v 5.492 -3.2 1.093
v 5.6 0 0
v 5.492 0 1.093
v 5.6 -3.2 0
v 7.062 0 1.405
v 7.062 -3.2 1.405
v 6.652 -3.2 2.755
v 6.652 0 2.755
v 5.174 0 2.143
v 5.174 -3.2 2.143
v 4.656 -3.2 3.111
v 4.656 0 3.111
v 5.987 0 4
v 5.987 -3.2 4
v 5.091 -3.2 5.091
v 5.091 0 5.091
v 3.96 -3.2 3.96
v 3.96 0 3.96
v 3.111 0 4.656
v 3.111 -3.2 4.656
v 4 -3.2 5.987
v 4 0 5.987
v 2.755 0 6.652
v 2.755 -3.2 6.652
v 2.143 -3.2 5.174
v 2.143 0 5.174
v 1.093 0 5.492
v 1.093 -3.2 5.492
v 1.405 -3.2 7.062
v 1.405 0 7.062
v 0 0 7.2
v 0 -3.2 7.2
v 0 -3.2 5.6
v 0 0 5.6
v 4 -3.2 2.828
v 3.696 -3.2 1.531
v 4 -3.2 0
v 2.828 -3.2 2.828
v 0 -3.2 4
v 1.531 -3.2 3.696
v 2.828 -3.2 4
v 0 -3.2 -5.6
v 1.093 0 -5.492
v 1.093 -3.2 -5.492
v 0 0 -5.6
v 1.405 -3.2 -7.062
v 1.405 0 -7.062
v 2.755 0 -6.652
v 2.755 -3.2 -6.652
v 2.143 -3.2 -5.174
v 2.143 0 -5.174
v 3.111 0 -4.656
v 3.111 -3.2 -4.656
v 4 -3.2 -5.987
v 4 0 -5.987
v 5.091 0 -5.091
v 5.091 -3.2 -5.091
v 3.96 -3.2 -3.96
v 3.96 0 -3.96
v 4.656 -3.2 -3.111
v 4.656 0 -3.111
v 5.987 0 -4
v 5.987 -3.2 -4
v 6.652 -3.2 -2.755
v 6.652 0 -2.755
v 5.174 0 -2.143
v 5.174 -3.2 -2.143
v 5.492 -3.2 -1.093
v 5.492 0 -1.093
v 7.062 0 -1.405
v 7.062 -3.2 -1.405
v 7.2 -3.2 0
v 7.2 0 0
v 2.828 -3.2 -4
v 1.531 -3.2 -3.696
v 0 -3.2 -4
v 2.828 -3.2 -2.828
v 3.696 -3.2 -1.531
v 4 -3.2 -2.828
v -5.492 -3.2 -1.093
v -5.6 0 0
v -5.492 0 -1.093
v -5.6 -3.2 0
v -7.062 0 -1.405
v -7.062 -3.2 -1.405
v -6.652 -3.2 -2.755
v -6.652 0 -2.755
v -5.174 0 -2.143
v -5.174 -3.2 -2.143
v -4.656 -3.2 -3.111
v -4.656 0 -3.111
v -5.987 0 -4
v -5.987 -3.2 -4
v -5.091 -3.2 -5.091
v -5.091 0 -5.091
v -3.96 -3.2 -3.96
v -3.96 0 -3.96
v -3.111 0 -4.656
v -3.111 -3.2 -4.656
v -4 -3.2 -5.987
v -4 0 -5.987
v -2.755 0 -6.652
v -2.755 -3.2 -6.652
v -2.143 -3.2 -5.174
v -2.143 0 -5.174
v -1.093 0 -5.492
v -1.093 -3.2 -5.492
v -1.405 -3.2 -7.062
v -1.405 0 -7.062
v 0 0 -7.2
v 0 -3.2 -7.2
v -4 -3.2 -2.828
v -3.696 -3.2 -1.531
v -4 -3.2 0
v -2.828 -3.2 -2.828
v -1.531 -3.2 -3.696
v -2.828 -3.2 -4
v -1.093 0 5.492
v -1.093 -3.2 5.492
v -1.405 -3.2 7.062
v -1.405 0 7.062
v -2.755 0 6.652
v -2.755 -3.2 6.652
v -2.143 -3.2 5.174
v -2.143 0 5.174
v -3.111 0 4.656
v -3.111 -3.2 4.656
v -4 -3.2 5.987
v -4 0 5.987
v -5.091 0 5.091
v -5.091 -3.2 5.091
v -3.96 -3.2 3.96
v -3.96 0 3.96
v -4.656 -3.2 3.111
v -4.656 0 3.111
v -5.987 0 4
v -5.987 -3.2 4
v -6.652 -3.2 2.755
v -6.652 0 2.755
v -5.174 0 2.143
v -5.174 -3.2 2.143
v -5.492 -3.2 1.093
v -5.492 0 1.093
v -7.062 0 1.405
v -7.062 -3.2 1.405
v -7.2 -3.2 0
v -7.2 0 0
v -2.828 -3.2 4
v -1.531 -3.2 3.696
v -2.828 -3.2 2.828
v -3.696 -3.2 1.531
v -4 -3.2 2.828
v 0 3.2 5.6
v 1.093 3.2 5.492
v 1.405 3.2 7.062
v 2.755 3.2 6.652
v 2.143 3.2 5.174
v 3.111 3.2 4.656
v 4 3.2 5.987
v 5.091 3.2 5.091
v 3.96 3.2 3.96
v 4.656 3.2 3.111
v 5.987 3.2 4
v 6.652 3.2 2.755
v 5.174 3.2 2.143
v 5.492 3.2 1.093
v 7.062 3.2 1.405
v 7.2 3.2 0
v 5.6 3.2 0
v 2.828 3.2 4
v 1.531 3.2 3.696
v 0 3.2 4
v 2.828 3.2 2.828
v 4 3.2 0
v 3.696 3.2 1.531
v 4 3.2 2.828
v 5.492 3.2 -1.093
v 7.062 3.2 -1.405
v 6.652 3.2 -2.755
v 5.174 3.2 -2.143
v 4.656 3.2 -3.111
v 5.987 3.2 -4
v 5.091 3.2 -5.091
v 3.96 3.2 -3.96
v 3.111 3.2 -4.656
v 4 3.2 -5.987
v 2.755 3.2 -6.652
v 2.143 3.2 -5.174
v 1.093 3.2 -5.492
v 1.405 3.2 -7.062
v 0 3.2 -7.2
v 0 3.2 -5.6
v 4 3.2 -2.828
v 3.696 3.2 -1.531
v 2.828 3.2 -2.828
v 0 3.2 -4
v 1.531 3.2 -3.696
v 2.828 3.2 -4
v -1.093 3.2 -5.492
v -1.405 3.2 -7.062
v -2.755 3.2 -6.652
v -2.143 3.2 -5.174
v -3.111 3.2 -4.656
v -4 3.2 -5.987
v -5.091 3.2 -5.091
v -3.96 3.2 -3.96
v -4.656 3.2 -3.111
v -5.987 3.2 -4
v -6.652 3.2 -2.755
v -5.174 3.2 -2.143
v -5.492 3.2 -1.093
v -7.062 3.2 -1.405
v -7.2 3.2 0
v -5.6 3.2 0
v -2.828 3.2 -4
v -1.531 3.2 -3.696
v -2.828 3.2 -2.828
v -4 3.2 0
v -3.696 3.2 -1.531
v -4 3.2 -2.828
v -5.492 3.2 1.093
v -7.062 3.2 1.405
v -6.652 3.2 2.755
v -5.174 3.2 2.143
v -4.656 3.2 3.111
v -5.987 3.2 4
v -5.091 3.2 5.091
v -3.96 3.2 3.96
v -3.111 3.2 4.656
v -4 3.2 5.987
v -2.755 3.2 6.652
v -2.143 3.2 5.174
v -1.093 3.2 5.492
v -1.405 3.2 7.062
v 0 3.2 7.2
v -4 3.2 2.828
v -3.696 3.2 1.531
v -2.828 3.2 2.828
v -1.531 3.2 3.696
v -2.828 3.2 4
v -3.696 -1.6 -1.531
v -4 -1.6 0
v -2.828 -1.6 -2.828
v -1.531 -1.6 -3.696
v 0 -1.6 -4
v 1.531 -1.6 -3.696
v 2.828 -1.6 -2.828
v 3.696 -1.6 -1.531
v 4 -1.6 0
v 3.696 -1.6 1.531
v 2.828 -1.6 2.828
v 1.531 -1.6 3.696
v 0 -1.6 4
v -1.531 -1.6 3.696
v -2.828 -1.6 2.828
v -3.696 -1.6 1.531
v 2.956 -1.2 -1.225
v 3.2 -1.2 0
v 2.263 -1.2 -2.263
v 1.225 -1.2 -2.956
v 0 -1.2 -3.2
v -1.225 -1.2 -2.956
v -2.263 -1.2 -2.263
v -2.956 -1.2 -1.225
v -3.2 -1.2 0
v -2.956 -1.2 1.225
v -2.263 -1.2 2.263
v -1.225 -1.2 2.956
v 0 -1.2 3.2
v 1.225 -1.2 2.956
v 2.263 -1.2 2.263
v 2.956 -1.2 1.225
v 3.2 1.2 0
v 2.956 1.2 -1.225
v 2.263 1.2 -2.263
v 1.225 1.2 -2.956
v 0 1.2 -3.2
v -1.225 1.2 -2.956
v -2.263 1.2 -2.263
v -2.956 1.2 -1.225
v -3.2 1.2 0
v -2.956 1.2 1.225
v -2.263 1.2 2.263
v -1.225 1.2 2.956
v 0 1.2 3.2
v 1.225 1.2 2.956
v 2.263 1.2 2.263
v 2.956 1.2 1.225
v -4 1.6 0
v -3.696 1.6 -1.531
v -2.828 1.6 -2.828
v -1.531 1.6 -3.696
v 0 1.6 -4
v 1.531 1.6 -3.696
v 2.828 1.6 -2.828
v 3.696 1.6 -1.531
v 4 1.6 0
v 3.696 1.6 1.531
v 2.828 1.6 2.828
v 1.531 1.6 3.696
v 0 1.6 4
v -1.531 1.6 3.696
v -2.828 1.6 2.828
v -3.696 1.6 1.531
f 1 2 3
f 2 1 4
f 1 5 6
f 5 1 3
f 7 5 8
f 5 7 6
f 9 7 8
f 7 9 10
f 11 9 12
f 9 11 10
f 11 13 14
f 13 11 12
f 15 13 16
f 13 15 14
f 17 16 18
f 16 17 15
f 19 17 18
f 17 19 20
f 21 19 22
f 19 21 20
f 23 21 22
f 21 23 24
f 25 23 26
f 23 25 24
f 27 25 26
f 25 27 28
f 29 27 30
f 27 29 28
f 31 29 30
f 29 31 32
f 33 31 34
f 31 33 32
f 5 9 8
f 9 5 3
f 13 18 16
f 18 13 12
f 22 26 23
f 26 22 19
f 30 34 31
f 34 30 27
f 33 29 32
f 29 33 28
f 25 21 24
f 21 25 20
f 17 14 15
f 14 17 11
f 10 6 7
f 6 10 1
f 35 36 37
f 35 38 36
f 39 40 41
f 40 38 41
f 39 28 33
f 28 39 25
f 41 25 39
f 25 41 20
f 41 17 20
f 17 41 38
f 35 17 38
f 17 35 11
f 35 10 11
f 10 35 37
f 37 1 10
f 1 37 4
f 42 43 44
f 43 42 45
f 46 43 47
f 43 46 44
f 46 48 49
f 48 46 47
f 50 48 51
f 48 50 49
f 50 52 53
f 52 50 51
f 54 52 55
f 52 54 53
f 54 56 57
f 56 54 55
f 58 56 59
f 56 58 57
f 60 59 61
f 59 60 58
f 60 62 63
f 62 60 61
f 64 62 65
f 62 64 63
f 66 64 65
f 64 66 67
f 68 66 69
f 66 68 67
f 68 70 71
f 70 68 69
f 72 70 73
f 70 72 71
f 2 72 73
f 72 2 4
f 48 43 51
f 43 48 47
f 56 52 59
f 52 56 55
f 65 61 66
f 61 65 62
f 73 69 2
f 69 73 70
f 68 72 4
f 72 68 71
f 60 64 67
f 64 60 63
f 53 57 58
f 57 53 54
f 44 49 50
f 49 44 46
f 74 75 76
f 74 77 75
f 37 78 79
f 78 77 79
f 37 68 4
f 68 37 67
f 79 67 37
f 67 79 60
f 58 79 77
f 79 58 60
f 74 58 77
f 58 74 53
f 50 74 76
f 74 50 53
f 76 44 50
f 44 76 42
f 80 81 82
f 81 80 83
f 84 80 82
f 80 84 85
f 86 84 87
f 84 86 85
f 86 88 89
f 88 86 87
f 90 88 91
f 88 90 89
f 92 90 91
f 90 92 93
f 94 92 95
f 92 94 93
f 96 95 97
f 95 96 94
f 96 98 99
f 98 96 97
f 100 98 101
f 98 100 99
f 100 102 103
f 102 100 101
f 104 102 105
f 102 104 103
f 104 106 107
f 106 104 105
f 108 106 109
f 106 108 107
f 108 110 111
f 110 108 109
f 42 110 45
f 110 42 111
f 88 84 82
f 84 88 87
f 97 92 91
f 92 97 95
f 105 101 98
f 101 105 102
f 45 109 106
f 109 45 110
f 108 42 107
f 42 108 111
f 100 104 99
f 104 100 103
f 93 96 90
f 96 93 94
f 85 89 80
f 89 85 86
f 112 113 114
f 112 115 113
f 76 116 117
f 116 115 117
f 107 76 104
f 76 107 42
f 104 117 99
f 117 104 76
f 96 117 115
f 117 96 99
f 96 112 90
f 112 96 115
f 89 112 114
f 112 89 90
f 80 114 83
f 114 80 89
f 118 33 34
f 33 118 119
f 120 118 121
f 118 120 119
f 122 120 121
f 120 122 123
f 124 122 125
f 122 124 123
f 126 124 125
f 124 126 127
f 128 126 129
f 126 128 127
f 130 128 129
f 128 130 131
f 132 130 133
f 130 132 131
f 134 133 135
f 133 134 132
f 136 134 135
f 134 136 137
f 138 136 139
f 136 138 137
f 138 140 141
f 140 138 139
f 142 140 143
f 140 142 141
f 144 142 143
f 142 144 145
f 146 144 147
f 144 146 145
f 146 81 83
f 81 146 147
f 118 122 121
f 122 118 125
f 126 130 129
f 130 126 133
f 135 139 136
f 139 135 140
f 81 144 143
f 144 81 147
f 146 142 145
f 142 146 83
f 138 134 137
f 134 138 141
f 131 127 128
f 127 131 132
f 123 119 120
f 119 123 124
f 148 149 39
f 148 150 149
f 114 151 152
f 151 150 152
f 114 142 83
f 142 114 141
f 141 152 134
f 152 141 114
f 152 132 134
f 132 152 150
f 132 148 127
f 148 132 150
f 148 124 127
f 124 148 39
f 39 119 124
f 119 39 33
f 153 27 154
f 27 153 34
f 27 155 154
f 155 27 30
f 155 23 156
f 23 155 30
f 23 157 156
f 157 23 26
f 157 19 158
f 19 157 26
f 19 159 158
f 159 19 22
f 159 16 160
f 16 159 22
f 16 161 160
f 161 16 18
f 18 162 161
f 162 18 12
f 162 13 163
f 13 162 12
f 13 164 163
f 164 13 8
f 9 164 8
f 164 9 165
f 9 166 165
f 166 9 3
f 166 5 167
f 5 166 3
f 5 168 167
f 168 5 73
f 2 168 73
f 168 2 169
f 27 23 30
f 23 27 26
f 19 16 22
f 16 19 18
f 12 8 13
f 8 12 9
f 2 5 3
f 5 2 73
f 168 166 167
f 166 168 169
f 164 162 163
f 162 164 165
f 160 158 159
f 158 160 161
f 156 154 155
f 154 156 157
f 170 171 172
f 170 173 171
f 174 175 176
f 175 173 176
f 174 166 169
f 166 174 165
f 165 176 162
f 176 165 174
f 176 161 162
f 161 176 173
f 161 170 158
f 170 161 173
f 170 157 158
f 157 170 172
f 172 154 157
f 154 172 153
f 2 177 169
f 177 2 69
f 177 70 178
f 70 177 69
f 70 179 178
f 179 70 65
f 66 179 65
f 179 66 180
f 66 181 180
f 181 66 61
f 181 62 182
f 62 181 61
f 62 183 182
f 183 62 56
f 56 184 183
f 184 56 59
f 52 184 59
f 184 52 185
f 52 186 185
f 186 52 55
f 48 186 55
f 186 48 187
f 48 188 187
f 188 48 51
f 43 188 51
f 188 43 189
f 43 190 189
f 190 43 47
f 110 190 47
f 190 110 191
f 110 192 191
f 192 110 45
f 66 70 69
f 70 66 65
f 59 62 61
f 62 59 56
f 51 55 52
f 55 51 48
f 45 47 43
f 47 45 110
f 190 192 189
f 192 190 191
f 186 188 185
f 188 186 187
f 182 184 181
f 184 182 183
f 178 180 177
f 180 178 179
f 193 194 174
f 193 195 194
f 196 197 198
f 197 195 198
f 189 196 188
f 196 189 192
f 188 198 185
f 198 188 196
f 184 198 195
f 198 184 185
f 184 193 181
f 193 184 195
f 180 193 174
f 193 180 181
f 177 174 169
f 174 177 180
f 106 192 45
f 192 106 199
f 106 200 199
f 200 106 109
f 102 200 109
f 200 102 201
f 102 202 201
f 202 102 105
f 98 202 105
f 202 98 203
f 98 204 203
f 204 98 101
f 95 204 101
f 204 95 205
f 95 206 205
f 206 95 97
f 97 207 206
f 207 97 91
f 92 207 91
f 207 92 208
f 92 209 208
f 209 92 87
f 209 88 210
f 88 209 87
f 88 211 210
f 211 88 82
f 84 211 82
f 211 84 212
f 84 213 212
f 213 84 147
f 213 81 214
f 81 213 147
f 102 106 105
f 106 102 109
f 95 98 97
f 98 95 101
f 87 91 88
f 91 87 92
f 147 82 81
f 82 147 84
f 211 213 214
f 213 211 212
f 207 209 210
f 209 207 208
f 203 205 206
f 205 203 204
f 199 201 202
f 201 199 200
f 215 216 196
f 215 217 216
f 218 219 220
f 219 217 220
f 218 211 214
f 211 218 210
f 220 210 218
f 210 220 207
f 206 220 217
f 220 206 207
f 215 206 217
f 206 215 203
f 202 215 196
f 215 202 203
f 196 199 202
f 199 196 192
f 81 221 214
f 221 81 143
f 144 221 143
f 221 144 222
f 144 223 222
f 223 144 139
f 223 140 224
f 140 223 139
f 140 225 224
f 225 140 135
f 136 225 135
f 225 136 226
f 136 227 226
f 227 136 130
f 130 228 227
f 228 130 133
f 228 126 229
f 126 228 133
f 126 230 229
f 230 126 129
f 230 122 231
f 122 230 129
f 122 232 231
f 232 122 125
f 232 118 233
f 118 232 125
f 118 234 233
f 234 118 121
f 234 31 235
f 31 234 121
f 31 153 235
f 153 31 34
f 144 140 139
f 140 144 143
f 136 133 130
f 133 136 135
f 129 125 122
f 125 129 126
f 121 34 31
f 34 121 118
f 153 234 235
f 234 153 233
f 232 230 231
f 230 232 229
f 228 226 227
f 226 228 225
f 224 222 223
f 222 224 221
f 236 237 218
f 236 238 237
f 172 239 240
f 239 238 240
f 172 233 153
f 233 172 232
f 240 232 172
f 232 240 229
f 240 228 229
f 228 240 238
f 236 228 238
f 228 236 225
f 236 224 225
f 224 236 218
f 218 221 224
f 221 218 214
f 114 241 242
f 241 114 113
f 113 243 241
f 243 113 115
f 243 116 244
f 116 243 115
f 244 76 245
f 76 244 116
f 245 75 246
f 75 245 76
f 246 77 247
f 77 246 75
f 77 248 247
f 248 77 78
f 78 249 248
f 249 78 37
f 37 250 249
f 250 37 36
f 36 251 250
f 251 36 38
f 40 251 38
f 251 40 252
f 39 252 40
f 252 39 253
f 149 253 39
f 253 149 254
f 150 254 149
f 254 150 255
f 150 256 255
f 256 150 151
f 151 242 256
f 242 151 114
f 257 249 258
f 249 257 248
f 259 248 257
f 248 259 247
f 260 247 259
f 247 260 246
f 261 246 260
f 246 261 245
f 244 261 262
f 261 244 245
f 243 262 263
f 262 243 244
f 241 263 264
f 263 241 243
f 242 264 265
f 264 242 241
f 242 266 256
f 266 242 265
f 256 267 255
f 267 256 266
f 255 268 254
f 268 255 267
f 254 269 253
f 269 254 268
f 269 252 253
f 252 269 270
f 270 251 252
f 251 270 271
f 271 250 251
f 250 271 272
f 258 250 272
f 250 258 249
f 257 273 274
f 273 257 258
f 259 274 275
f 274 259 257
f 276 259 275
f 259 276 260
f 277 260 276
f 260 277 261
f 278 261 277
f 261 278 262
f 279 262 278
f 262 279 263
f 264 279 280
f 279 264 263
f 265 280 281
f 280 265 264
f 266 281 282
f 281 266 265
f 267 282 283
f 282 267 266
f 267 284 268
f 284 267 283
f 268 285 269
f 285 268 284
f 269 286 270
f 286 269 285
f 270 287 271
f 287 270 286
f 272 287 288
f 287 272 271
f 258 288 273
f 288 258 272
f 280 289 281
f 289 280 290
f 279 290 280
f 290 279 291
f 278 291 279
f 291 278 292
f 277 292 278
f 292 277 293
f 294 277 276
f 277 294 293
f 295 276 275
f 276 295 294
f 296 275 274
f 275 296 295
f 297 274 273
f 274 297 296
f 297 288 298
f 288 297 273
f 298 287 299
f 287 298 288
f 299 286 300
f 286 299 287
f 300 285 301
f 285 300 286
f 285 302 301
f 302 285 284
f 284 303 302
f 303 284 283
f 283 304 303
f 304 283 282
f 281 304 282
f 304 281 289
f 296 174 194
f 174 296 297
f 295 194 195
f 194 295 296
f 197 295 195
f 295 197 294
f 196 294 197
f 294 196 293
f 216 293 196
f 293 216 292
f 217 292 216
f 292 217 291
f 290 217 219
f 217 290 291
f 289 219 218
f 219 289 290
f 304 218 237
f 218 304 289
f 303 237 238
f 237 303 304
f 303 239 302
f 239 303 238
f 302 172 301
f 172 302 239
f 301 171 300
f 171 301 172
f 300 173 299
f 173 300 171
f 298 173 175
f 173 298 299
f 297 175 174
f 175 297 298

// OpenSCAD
// file: ../p/rect3.scad
use <../lib.scad>
function ldraw_lib__rect3() = [
// 0 Rectangle with 3 Edges
// 0 Name: rect3.dat
// 0 Author: Mark Kennedy [mkennedy]
// 0 !LDRAW_ORG Primitive UPDATE 2010-01
// 0 !LICENSE Licensed under CC BY 4.0 : see CAreadme.txt
// 
// 0 BFC CERTIFY CCW
  [0,"BFC","CERTIFY"],
  [0,"BFC","CCW"],
// 
// 0 !HISTORY 2003-08-01 [PTadmin] Official Update 2003-02
// 0 !HISTORY 2007-06-24 [PTadmin] Header formatted for Contributor Agreement
// 0 !HISTORY 2008-07-01 [PTadmin] Official Update 2008-01
// 0 !HISTORY 2010-01-17 [mikeheide] Change winding to CCW
// 0 !HISTORY 2010-04-05 [PTadmin] Official Update 2010-01
// 
// 
// 2 24 1 0 1 -1 0 1
  [2,24,1,0,1,-1,0,1],
// 2 24 1 0 1 1 0 -1
  [2,24,1,0,1,1,0,-1],
// 2 24 -1 0 1 -1 0 -1
  [2,24,-1,0,1,-1,0,-1],
// 4 16 -1 0 1 -1 0 -1 1 0 -1 1 0 1
  [4,16,-1,0,1,-1,0,-1,1,0,-1,1,0,1],
// 0 //
];
module ldraw_lib__rect3(step=0, col=false, unit=2/5, alt=false, line=0.2, solid=!$preview)
    makepoly(ldraw_lib__rect3(), step=step, col=col, unit=unit, alt=alt, line=line, solid=solid);
ldraw_lib__rect3(line=0.2);
// file: ../p/rect2p.scad
use <../lib.scad>
function ldraw_lib__rect2p() = [
// 0 Rectangle with 2 Parallel Edges
// 0 Name: rect2p.dat
// 0 Author: Donald Sutter [technog]
// 0 !LDRAW_ORG Primitive UPDATE 2010-01
// 0 !LICENSE Licensed under CC BY 4.0 : see CAreadme.txt
// 
// 0 BFC CERTIFY CCW
  [0,"BFC","CERTIFY"],
  [0,"BFC","CCW"],
// 
// 0 !HISTORY 2003-08-01 [PTadmin] Official Update 2003-02
// 0 !HISTORY 2007-06-24 [PTadmin] Header formatted for Contributor Agreement
// 0 !HISTORY 2008-07-01 [PTadmin] Official Update 2008-01
// 0 !HISTORY 2010-01-17 [mikeheide] changed winding to CCW
// 0 !HISTORY 2010-04-05 [PTadmin] Official Update 2010-01
// 
// 
// 2 24 1 0 1 -1 0 1
  [2,24,1,0,1,-1,0,1],
// 2 24 -1 0 -1 1 0 -1
  [2,24,-1,0,-1,1,0,-1],
// 4 16 -1 0 1 -1 0 -1 1 0 -1 1 0 1
  [4,16,-1,0,1,-1,0,-1,1,0,-1,1,0,1],
// 0
];
module ldraw_lib__rect2p(step=0, col=false, unit=2/5, alt=false, line=0.2, solid=!$preview)
    makepoly(ldraw_lib__rect2p(), step=step, col=col, unit=unit, alt=alt, line=line, solid=solid);
ldraw_lib__rect2p(line=0.2);
// file: ../p/rect.scad
use <../lib.scad>
function ldraw_lib__rect() = [
// 0 Rectangle
// 0 Name: rect.dat
// 0 Author: James Jessiman
// 0 !LDRAW_ORG Primitive UPDATE 2010-01
// 0 !LICENSE Licensed under CC BY 4.0 : see CAreadme.txt
// 
// 0 BFC CERTIFY CCW
  [0,"BFC","CERTIFY"],
  [0,"BFC","CCW"],
// 
// 0 !HISTORY 2002-04-05 [hafhead] Added BFC statement
// 0 !HISTORY 2002-04-25 [PTadmin] Official Update 2002-02
// 0 !HISTORY 2007-06-24 [PTadmin] Header formatted for Contributor Agreement
// 0 !HISTORY 2008-07-01 [PTadmin] Official Update 2008-01
// 0 !HISTORY 2010-01-17 [mikeheide] changed winding to CCW
// 0 !HISTORY 2010-04-05 [PTadmin] Official Update 2010-01
// 
// 
// 2 24 1 0 1 -1 0 1
  [2,24,1,0,1,-1,0,1],
// 2 24 -1 0 1 -1 0 -1
  [2,24,-1,0,1,-1,0,-1],
// 2 24 -1 0 -1 1 0 -1
  [2,24,-1,0,-1,1,0,-1],
// 2 24 1 0 -1 1 0 1
  [2,24,1,0,-1,1,0,1],
// 4 16 -1 0 1 -1 0 -1 1 0 -1 1 0 1
  [4,16,-1,0,1,-1,0,-1,1,0,-1,1,0,1],
// 0
];
module ldraw_lib__rect(step=0, col=false, unit=2/5, alt=false, line=0.2, solid=!$preview)
    makepoly(ldraw_lib__rect(), step=step, col=col, unit=unit, alt=alt, line=line, solid=solid);
ldraw_lib__rect(line=0.2);
// file: ../p/1-8tndis.scad
use <../lib.scad>
function ldraw_lib__1_8tndis() = [
// 0 Disc Negative Truncated 0.125
// 0 Name: 1-8tndis.dat
// 0 Author: Massimo Maso [Sirio]
// 0 !LDRAW_ORG Primitive UPDATE 2022-02
// 0 !LICENSE Licensed under CC BY 4.0 : see CAreadme.txt
// 
// 0 BFC CERTIFY CCW
  [0,"BFC","CERTIFY"],
  [0,"BFC","CCW"],
// 
// 0 !HISTORY 2022-03-06 [PTadmin] Official Update 2022-02
// 
// 
// 3 16 1 0 .7071 .9239 0 .3827 1 0 0
  [3,16,1,0,.7071,.9239,0,.3827,1,0,0],
// 3 16 1 0 .7071 .7071 0 .7071 .9239 0 .3827
  [3,16,1,0,.7071,.7071,0,.7071,.9239,0,.3827],
];
module ldraw_lib__1_8tndis(step=0, col=false, unit=2/5, alt=false, line=0.2, solid=!$preview)
    makepoly(ldraw_lib__1_8tndis(), step=step, col=col, unit=unit, alt=alt, line=line, solid=solid);
ldraw_lib__1_8tndis(line=0.2);
// file: ../p/4-4edge.scad
use <../lib.scad>
function ldraw_lib__4_4edge() = [
// 0 Circle 1.0
// 0 Name: 4-4edge.dat
// 0 Author: James Jessiman
// 0 !LDRAW_ORG Primitive UPDATE 2017-01
// 0 !LICENSE Licensed under CC BY 4.0 : see CAreadme.txt
// 
// 0 BFC CERTIFY CCW
  [0,"BFC","CERTIFY"],
  [0,"BFC","CCW"],
// 
// 0 !HISTORY 1998-12-15 [PTadmin] Official Update 1998-10
// 0 !HISTORY 2005-12-28 [PTadmin] Official Update 2005-01
// 0 !HISTORY 2007-06-24 [PTadmin] Header formatted for Contributor Agreement
// 0 !HISTORY 2008-07-01 [PTadmin] Official Update 2008-01
// 0 !HISTORY 2017-01-15 [Steffen] BFCed
// 0 !HISTORY 2017-12-30 [PTadmin] Official Update 2017-01
// 
// 
// 2 24 1 0 0 0.9239 0 0.3827
  [2,24,1,0,0,0.9239,0,0.3827],
// 2 24 0.9239 0 0.3827 0.7071 0 0.7071
  [2,24,0.9239,0,0.3827,0.7071,0,0.7071],
// 2 24 0.7071 0 0.7071 0.3827 0 0.9239
  [2,24,0.7071,0,0.7071,0.3827,0,0.9239],
// 2 24 0.3827 0 0.9239 0 0 1
  [2,24,0.3827,0,0.9239,0,0,1],
// 2 24 0 0 1 -0.3827 0 0.9239
  [2,24,0,0,1,-0.3827,0,0.9239],
// 2 24 -0.3827 0 0.9239 -0.7071 0 0.7071
  [2,24,-0.3827,0,0.9239,-0.7071,0,0.7071],
// 2 24 -0.7071 0 0.7071 -0.9239 0 0.3827
  [2,24,-0.7071,0,0.7071,-0.9239,0,0.3827],
// 2 24 -0.9239 0 0.3827 -1 0 -0
  [2,24,-0.9239,0,0.3827,-1,0,-0],
// 2 24 -1 0 -0 -0.9239 0 -0.3827
  [2,24,-1,0,-0,-0.9239,0,-0.3827],
// 2 24 -0.9239 0 -0.3827 -0.7071 0 -0.7071
  [2,24,-0.9239,0,-0.3827,-0.7071,0,-0.7071],
// 2 24 -0.7071 0 -0.7071 -0.3827 0 -0.9239
  [2,24,-0.7071,0,-0.7071,-0.3827,0,-0.9239],
// 2 24 -0.3827 0 -0.9239 0 0 -1
  [2,24,-0.3827,0,-0.9239,0,0,-1],
// 2 24 0 0 -1 0.3827 0 -0.9239
  [2,24,0,0,-1,0.3827,0,-0.9239],
// 2 24 0.3827 0 -0.9239 0.7071 0 -0.7071
  [2,24,0.3827,0,-0.9239,0.7071,0,-0.7071],
// 2 24 0.7071 0 -0.7071 0.9239 0 -0.3827
  [2,24,0.7071,0,-0.7071,0.9239,0,-0.3827],
// 2 24 0.9239 0 -0.3827 1 0 0
  [2,24,0.9239,0,-0.3827,1,0,0],
];
module ldraw_lib__4_4edge(step=0, col=false, unit=2/5, alt=false, line=0.2, solid=!$preview)
    makepoly(ldraw_lib__4_4edge(), step=step, col=col, unit=unit, alt=alt, line=line, solid=solid);
ldraw_lib__4_4edge(line=0.2);
// file: ../p/4-4cyli.scad
use <../lib.scad>
function ldraw_lib__4_4cyli() = [
// 0 Cylinder 1.0
// 0 Name: 4-4cyli.dat
// 0 Author: James Jessiman
// 0 !LDRAW_ORG Primitive UPDATE 2005-01
// 0 !LICENSE Licensed under CC BY 4.0 : see CAreadme.txt
// 
// 0 BFC CERTIFY CCW
  [0,"BFC","CERTIFY"],
  [0,"BFC","CCW"],
// 
// 0 !HISTORY 1998-12-15 [PTadmin] Official Update 1998-10
// 0 !HISTORY 2002-03-23 [sbliss] Added BFC statement; merged headers from files in distributions LDraw 0.27 and Complete.
// 0 !HISTORY 2002-04-25 [PTadmin] Official Update 2002-02
// 0 !HISTORY 2004-12-14 [guyvivan] BFC CCW
// 0 !HISTORY 2005-12-28 [PTadmin] Official Update 2005-01
// 0 !HISTORY 2007-06-24 [PTadmin] Header formatted for Contributor Agreement
// 0 !HISTORY 2008-07-01 [PTadmin] Official Update 2008-01
// 
// 
// 4 16 1 1 0 0.9239 1 0.3827 0.9239 0 0.3827 1 0 0
  [4,16,1,1,0,0.9239,1,0.3827,0.9239,0,0.3827,1,0,0],
// 5 24 1 0 0 1 1 0 0.9239 0 0.3827 0.9239 0 -0.3827
  [5,24,1,0,0,1,1,0,0.9239,0,0.3827,0.9239,0,-0.3827],
// 4 16 0.9239 1 0.3827 0.7071 1 0.7071 0.7071 0 0.7071 0.9239 0 0.3827
  [4,16,0.9239,1,0.3827,0.7071,1,0.7071,0.7071,0,0.7071,0.9239,0,0.3827],
// 5 24 0.9239 0 0.3827 0.9239 1 0.3827 0.7071 0 0.7071 1 0 0
  [5,24,0.9239,0,0.3827,0.9239,1,0.3827,0.7071,0,0.7071,1,0,0],
// 4 16 0.7071 1 0.7071 0.3827 1 0.9239 0.3827 0 0.9239 0.7071 0 0.7071
  [4,16,0.7071,1,0.7071,0.3827,1,0.9239,0.3827,0,0.9239,0.7071,0,0.7071],
// 5 24 0.7071 0 0.7071 0.7071 1 0.7071 0.3827 0 0.9239 0.9239 0 0.3827
  [5,24,0.7071,0,0.7071,0.7071,1,0.7071,0.3827,0,0.9239,0.9239,0,0.3827],
// 4 16 0.3827 1 0.9239 0 1 1 0 0 1 0.3827 0 0.9239
  [4,16,0.3827,1,0.9239,0,1,1,0,0,1,0.3827,0,0.9239],
// 5 24 0.3827 0 0.9239 0.3827 1 0.9239 0 0 1 0.7071 0 0.7071
  [5,24,0.3827,0,0.9239,0.3827,1,0.9239,0,0,1,0.7071,0,0.7071],
// 4 16 0 1 1 -0.3827 1 0.9239 -0.3827 0 0.9239 0 0 1
  [4,16,0,1,1,-0.3827,1,0.9239,-0.3827,0,0.9239,0,0,1],
// 5 24 0 0 1 0 1 1 -0.3827 0 0.9239 0.3827 0 0.9239
  [5,24,0,0,1,0,1,1,-0.3827,0,0.9239,0.3827,0,0.9239],
// 4 16 -0.3827 1 0.9239 -0.7071 1 0.7071 -0.7071 0 0.7071 -0.3827 0 0.9239
  [4,16,-0.3827,1,0.9239,-0.7071,1,0.7071,-0.7071,0,0.7071,-0.3827,0,0.9239],
// 5 24 -0.3827 0 0.9239 -0.3827 1 0.9239 -0.7071 0 0.7071 0 0 1
  [5,24,-0.3827,0,0.9239,-0.3827,1,0.9239,-0.7071,0,0.7071,0,0,1],
// 4 16 -0.7071 1 0.7071 -0.9239 1 0.3827 -0.9239 0 0.3827 -0.7071 0 0.7071
  [4,16,-0.7071,1,0.7071,-0.9239,1,0.3827,-0.9239,0,0.3827,-0.7071,0,0.7071],
// 5 24 -0.7071 0 0.7071 -0.7071 1 0.7071 -0.9239 0 0.3827 -0.3827 0 0.9239
  [5,24,-0.7071,0,0.7071,-0.7071,1,0.7071,-0.9239,0,0.3827,-0.3827,0,0.9239],
// 4 16 -0.9239 1 0.3827 -1 1 0 -1 0 0 -0.9239 0 0.3827
  [4,16,-0.9239,1,0.3827,-1,1,0,-1,0,0,-0.9239,0,0.3827],
// 5 24 -0.9239 0 0.3827 -0.9239 1 0.3827 -1 0 0 -0.7071 0 0.7071
  [5,24,-0.9239,0,0.3827,-0.9239,1,0.3827,-1,0,0,-0.7071,0,0.7071],
// 4 16 -1 1 0 -0.9239 1 -0.3827 -0.9239 0 -0.3827 -1 0 0
  [4,16,-1,1,0,-0.9239,1,-0.3827,-0.9239,0,-0.3827,-1,0,0],
// 5 24 -1 0 0 -1 1 0 -0.9239 0 -0.3827 -0.9239 0 0.3827
  [5,24,-1,0,0,-1,1,0,-0.9239,0,-0.3827,-0.9239,0,0.3827],
// 4 16 -0.9239 1 -0.3827 -0.7071 1 -0.7071 -0.7071 0 -0.7071 -0.9239 0 -0.3827
  [4,16,-0.9239,1,-0.3827,-0.7071,1,-0.7071,-0.7071,0,-0.7071,-0.9239,0,-0.3827],
// 5 24 -0.9239 0 -0.3827 -0.9239 1 -0.3827 -0.7071 0 -0.7071 -1 0 0
  [5,24,-0.9239,0,-0.3827,-0.9239,1,-0.3827,-0.7071,0,-0.7071,-1,0,0],
// 4 16 -0.7071 1 -0.7071 -0.3827 1 -0.9239 -0.3827 0 -0.9239 -0.7071 0 -0.7071
  [4,16,-0.7071,1,-0.7071,-0.3827,1,-0.9239,-0.3827,0,-0.9239,-0.7071,0,-0.7071],
// 5 24 -0.7071 0 -0.7071 -0.7071 1 -0.7071 -0.3827 0 -0.9239 -0.9239 0 -0.3827
  [5,24,-0.7071,0,-0.7071,-0.7071,1,-0.7071,-0.3827,0,-0.9239,-0.9239,0,-0.3827],
// 4 16 -0.3827 1 -0.9239 0 1 -1 0 0 -1 -0.3827 0 -0.9239
  [4,16,-0.3827,1,-0.9239,0,1,-1,0,0,-1,-0.3827,0,-0.9239],
// 5 24 -0.3827 0 -0.9239 -0.3827 1 -0.9239 0 0 -1 -0.7071 0 -0.7071
  [5,24,-0.3827,0,-0.9239,-0.3827,1,-0.9239,0,0,-1,-0.7071,0,-0.7071],
// 4 16 0 1 -1 0.3827 1 -0.9239 0.3827 0 -0.9239 0 0 -1
  [4,16,0,1,-1,0.3827,1,-0.9239,0.3827,0,-0.9239,0,0,-1],
// 5 24 0 0 -1 0 1 -1 0.3827 0 -0.9239 -0.3827 0 -0.9239
  [5,24,0,0,-1,0,1,-1,0.3827,0,-0.9239,-0.3827,0,-0.9239],
// 4 16 0.3827 1 -0.9239 0.7071 1 -0.7071 0.7071 0 -0.7071 0.3827 0 -0.9239
  [4,16,0.3827,1,-0.9239,0.7071,1,-0.7071,0.7071,0,-0.7071,0.3827,0,-0.9239],
// 5 24 0.3827 0 -0.9239 0.3827 1 -0.9239 0.7071 0 -0.7071 0 0 -1
  [5,24,0.3827,0,-0.9239,0.3827,1,-0.9239,0.7071,0,-0.7071,0,0,-1],
// 4 16 0.7071 1 -0.7071 0.9239 1 -0.3827 0.9239 0 -0.3827 0.7071 0 -0.7071
  [4,16,0.7071,1,-0.7071,0.9239,1,-0.3827,0.9239,0,-0.3827,0.7071,0,-0.7071],
// 5 24 0.7071 0 -0.7071 0.7071 1 -0.7071 0.9239 0 -0.3827 0.3827 0 -0.9239
  [5,24,0.7071,0,-0.7071,0.7071,1,-0.7071,0.9239,0,-0.3827,0.3827,0,-0.9239],
// 4 16 0.9239 1 -0.3827 1 1 0 1 0 0 0.9239 0 -0.3827
  [4,16,0.9239,1,-0.3827,1,1,0,1,0,0,0.9239,0,-0.3827],
// 5 24 0.9239 0 -0.3827 0.9239 1 -0.3827 1 0 0 0.7071 0 -0.7071
  [5,24,0.9239,0,-0.3827,0.9239,1,-0.3827,1,0,0,0.7071,0,-0.7071],
// 0
];
module ldraw_lib__4_4cyli(step=0, col=false, unit=2/5, alt=false, line=0.2, solid=!$preview)
    makepoly(ldraw_lib__4_4cyli(), step=step, col=col, unit=unit, alt=alt, line=line, solid=solid);
ldraw_lib__4_4cyli(line=0.2);
// file: s/3641s01.scad
use <../../lib.scad>
use <../../p/1-8tndis.scad>
use <../../p/rect.scad>
use <../../p/rect2p.scad>
use <../../p/rect3.scad>
function ldraw_lib__s__3641s01() = [
// 0 ~Tyre  6/ 50 x  8 Offset Tread Eigth
// 0 Name: s\3641s01.dat
// 0 Author: Rene Rechthaler [Blechtaler]
// 0 !LDRAW_ORG Subpart UPDATE 2025-03
// 0 !LICENSE Licensed under CC BY 4.0 : see CAreadme.txt
// 
// 0 BFC CERTIFY CCW
  [0,"BFC","CERTIFY"],
  [0,"BFC","CCW"],
// 
// 0 !HISTORY 2025-03-30 [OrionP] Official Update 2025-03
// 
// 1 16 13.8656 -1.3657 -4 .1344 0 0 1.3657 1 0 0 0 4 rect2p.dat
  [1,16,13.8656,-1.3657,-4,.1344,0,0,1.3657,1,0,0,0,4, ldraw_lib__rect2p()],
// 1 16 15.6928 -3.1216 -4 1.9616 0 0 -.3902 -1 0 0 0 4 rect.dat
  [1,16,15.6928,-3.1216,-4,1.9616,0,0,-.3902,-1,0,0,0,4, ldraw_lib__rect()],
// 1 16 17.1423 -5.2002 -4 .5121 0 0 1.6884 1 0 0 0 4 rect2p.dat
  [1,16,17.1423,-5.2002,-4,.5121,0,0,1.6884,1,0,0,0,4, ldraw_lib__rect2p()],
// 1 16 14.7824 -6.1232 -4 -1.8478 0 0 .7654 1 0 0 0 4 rect.dat
  [1,16,14.7824,-6.1232,-4,-1.8478,0,0,.7654,1,0,0,0,4, ldraw_lib__rect()],
// 1 16 12.2878 -6.5681 -4 .6468 0 0 1.2103 1 0 0 0 4 rect2p.dat
  [1,16,12.2878,-6.5681,-4,.6468,0,0,1.2103,1,0,0,0,4, ldraw_lib__rect2p()],
// 1 16 13.304 -8.8896 -4 1.663 0 0 -1.1112 -1 0 0 0 4 rect.dat
  [1,16,13.304,-8.8896,-4,1.663,0,0,-1.1112,-1,0,0,0,4, ldraw_lib__rect()],
// 1 16 13.8474 -11.3643 -4 1.1196 0 0 1.3635 1 0 0 0 4 rect2p.dat
  [1,16,13.8474,-11.3643,-4,1.1196,0,0,1.3635,1,0,0,0,4, ldraw_lib__rect2p()],
// 1 16 11.3136 -11.3136 -4 -1.4142 0 0 1.4142 1 0 0 0 -4 rect3.dat
  [1,16,11.3136,-11.3136,-4,-1.4142,0,0,1.4142,1,0,0,0,-4, ldraw_lib__rect3()],
// 1 16 8.8389 -10.7702 -4 1.0605 0 0 .8708 1 0 0 0 4 rect2p.dat
  [1,16,8.8389,-10.7702,-4,1.0605,0,0,.8708,1,0,0,0,4, ldraw_lib__rect2p()],
// 1 16 8.8896 -13.304 -4 1.1112 0 0 -1.663 -1 0 0 0 -4 rect3.dat
  [1,16,8.8896,-13.304,-4,1.1112,0,0,-1.663,-1,0,0,0,-4, ldraw_lib__rect3()],
// 1 16 8.4447 -15.7986 -4 1.5561 0 0 .8316 1 0 0 0 4 rect2p.dat
  [1,16,8.4447,-15.7986,-4,1.5561,0,0,.8316,1,0,0,0,4, ldraw_lib__rect2p()],
// 1 16 6.1232 -14.7824 -4 -.7654 0 0 1.8478 1 0 0 0 -4 rect3.dat
  [1,16,6.1232,-14.7824,-4,-.7654,0,0,1.8478,1,0,0,0,-4, ldraw_lib__rect3()],
// 1 16 4.0446 -13.3329 -4 1.3132 0 0 .3983 1 0 0 0 4 rect2p.dat
  [1,16,4.0446,-13.3329,-4,1.3132,0,0,.3983,1,0,0,0,4, ldraw_lib__rect2p()],
// 1 16 3.1216 -15.6928 -4 .3902 0 0 -1.9616 -1 0 0 0 -4 rect3.dat
  [1,16,3.1216,-15.6928,-4,.3902,0,0,-1.9616,-1,0,0,0,-4, ldraw_lib__rect3()],
// 1 16 1.7559 -17.8272 -4 1.7559 0 0 .1728 1 0 0 0 4 rect2p.dat
  [1,16,1.7559,-17.8272,-4,1.7559,0,0,.1728,1,0,0,0,4, ldraw_lib__rect2p()],
// 1 16 0 -16 -4 0 1 0 2 0 0 0 0 -4 rect3.dat
  [1,16,0,-16,-4,0,1,0,2,0,0,0,0,-4, ldraw_lib__rect3()],
// 
// 4 16 16.6302 -6.8886 0 17.6544 -3.5118 0 13.7312 -2.7314 0 12.9346 -5.3578 0
  [4,16,16.6302,-6.8886,0,17.6544,-3.5118,0,13.7312,-2.7314,0,12.9346,-5.3578,0],
// 4 16 12.7278 -12.7278 0 14.967 -10.0008 0 11.641 -7.7784 0 9.8994 -9.8994 0
  [4,16,12.7278,-12.7278,0,14.967,-10.0008,0,11.641,-7.7784,0,9.8994,-9.8994,0],
// 4 16 6.8886 -16.6302 0 10.0008 -14.967 0 7.7784 -11.641 0 5.3578 -12.9346 0
  [4,16,6.8886,-16.6302,0,10.0008,-14.967,0,7.7784,-11.641,0,5.3578,-12.9346,0],
// 4 16 0 -18 0 3.5118 -17.6544 0 2.7314 -13.7312 0 0 -14 0
  [4,16,0,-18,0,3.5118,-17.6544,0,2.7314,-13.7312,0,0,-14,0],
// 
// 4 16 3.5118 -17.6544 -8 0 -18 -8 0 -14 -8 2.7314 -13.7312 -8
  [4,16,3.5118,-17.6544,-8,0,-18,-8,0,-14,-8,2.7314,-13.7312,-8],
// 4 16 10.0008 -14.967 -8 6.8886 -16.6302 -8 5.3578 -12.9346 -8 7.7784 -11.641 -8
  [4,16,10.0008,-14.967,-8,6.8886,-16.6302,-8,5.3578,-12.9346,-8,7.7784,-11.641,-8],
// 4 16 14.967 -10.0008 -8 12.7278 -12.7278 -8 9.8994 -9.8994 -8 11.641 -7.7784 -8
  [4,16,14.967,-10.0008,-8,12.7278,-12.7278,-8,9.8994,-9.8994,-8,11.641,-7.7784,-8],
// 4 16 17.6544 -3.5118 -8 16.6302 -6.8886 -8 12.9346 -5.3578 -8 13.7312 -2.7314 -8
  [4,16,17.6544,-3.5118,-8,16.6302,-6.8886,-8,12.9346,-5.3578,-8,13.7312,-2.7314,-8],
// 
// 1 16 0 0 -8 10 0 0 0 0 -10 0 1 0 1-8tndis.dat
  [1,16,0,0,-8,10,0,0,0,0,-10,0,1,0, ldraw_lib__1_8tndis()],
// 1 16 0 0 -8 0 0 10 -10 0 0 0 1 0 1-8tndis.dat
  [1,16,0,0,-8,0,0,10,-10,0,0,0,1,0, ldraw_lib__1_8tndis()],
// 4 16 2.7314 -13.7312 -8 0 -14 -8 0 -10 -8 5.3578 -12.9346 -8
  [4,16,2.7314,-13.7312,-8,0,-14,-8,0,-10,-8,5.3578,-12.9346,-8],
// 4 16 5.3578 -12.9346 -8 0 -10 -8 7.071 -10 -8 7.7784 -11.641 -8
  [4,16,5.3578,-12.9346,-8,0,-10,-8,7.071,-10,-8,7.7784,-11.641,-8],
// 4 16 9.8994 -9.8994 -8 7.7784 -11.641 -8 7.071 -10 -8 7.071 -7.071 -8
  [4,16,9.8994,-9.8994,-8,7.7784,-11.641,-8,7.071,-10,-8,7.071,-7.071,-8],
// 4 16 9.8994 -9.8994 -8 7.071 -7.071 -8 10 -7.071 -8 11.641 -7.7784 -8
  [4,16,9.8994,-9.8994,-8,7.071,-7.071,-8,10,-7.071,-8,11.641,-7.7784,-8],
// 4 16 12.9346 -5.3578 -8 11.641 -7.7784 -8 10 -7.071 -8 10 0 -8
  [4,16,12.9346,-5.3578,-8,11.641,-7.7784,-8,10,-7.071,-8,10,0,-8],
// 4 16 13.7312 -2.7314 -8 12.9346 -5.3578 -8 10 0 -8 14 0 -8
  [4,16,13.7312,-2.7314,-8,12.9346,-5.3578,-8,10,0,-8,14,0,-8],
];
module ldraw_lib__s__3641s01(step=0, col=false, unit=2/5, alt=false, line=0.2, solid=!$preview)
    makepoly(ldraw_lib__s__3641s01(), step=step, col=col, unit=unit, alt=alt, line=line, solid=solid);
ldraw_lib__s__3641s01(line=0.2);
// file: ../p/4-4cylo.scad
use <../lib.scad>
use <4-4cyli.scad>
use <4-4edge.scad>
function ldraw_lib__4_4cylo() = [
// 0 Cylinder Open 1.0
// 0 Name: 4-4cylo.dat
// 0 Author: Mark Kennedy [mkennedy]
// 0 !LDRAW_ORG Primitive UPDATE 2010-01
// 0 !LICENSE Licensed under CC BY 4.0 : see CAreadme.txt
// 
// 0 BFC CERTIFY CCW
  [0,"BFC","CERTIFY"],
  [0,"BFC","CCW"],
// 
// 0 !HISTORY 2010-04-05 [PTadmin] Official Update 2010-01
// 
// 
// 1 16 0 0 0 1 0 0 0 1 0 0 0 1 4-4edge.dat
  [1,16,0,0,0,1,0,0,0,1,0,0,0,1, ldraw_lib__4_4edge()],
// 1 16 0 1 0 1 0 0 0 1 0 0 0 1 4-4edge.dat
  [1,16,0,1,0,1,0,0,0,1,0,0,0,1, ldraw_lib__4_4edge()],
// 1 16 0 0 0 1 0 0 0 1 0 0 0 1 4-4cyli.dat
  [1,16,0,0,0,1,0,0,0,1,0,0,0,1, ldraw_lib__4_4cyli()],
// 0
];
module ldraw_lib__4_4cylo(step=0, col=false, unit=2/5, alt=false, line=0.2, solid=!$preview)
    makepoly(ldraw_lib__4_4cylo(), step=step, col=col, unit=unit, alt=alt, line=line, solid=solid);
ldraw_lib__4_4cylo(line=0.2);
// file: ../p/4-4con4.scad
use <../lib.scad>
function ldraw_lib__4_4con4() = [
// 0 Cone  4 x 1.0
// 0 Name: 4-4con4.dat
// 0 Author: Willy Tschager [Holly-Wood]
// 0 !LDRAW_ORG Primitive UPDATE 2024-01
// 0 !LICENSE Licensed under CC BY 4.0 : see CAreadme.txt
// 
// 0 BFC CERTIFY CCW
  [0,"BFC","CERTIFY"],
  [0,"BFC","CCW"],
// 
// 0 !HISTORY 2003-08-01 [PTadmin] Official Update 2003-02
// 0 !HISTORY 2007-06-24 [PTadmin] Header formatted for Contributor Agreement
// 0 !HISTORY 2008-07-01 [PTadmin] Official Update 2008-01
// 0 !HISTORY 2012-02-16 [Philo] Changed to CCW
// 0 !HISTORY 2012-03-30 [PTadmin] Official Update 2012-01
// 0 !HISTORY 2024-01-07 [Holly-Wood] Complete regeneration, original by jriley
// 0 !HISTORY 2024-01-29 [OrionP] Official Update 2024-01
// 
// 4 16 4 1 0 3.6956 1 1.5308 4.6195 0 1.9135 5 0 0
  [4,16,4,1,0,3.6956,1,1.5308,4.6195,0,1.9135,5,0,0],
// 4 16 3.6956 1 1.5308 2.8284 1 2.8284 3.5355 0 3.5355 4.6195 0 1.9135
  [4,16,3.6956,1,1.5308,2.8284,1,2.8284,3.5355,0,3.5355,4.6195,0,1.9135],
// 4 16 2.8284 1 2.8284 1.5308 1 3.6956 1.9135 0 4.6195 3.5355 0 3.5355
  [4,16,2.8284,1,2.8284,1.5308,1,3.6956,1.9135,0,4.6195,3.5355,0,3.5355],
// 4 16 1.5308 1 3.6956 0 1 4 0 0 5 1.9135 0 4.6195
  [4,16,1.5308,1,3.6956,0,1,4,0,0,5,1.9135,0,4.6195],
// 4 16 0 1 4 -1.5308 1 3.6956 -1.9135 0 4.6195 0 0 5
  [4,16,0,1,4,-1.5308,1,3.6956,-1.9135,0,4.6195,0,0,5],
// 4 16 -1.5308 1 3.6956 -2.8284 1 2.8284 -3.5355 0 3.5355 -1.9135 0 4.6195
  [4,16,-1.5308,1,3.6956,-2.8284,1,2.8284,-3.5355,0,3.5355,-1.9135,0,4.6195],
// 4 16 -2.8284 1 2.8284 -3.6956 1 1.5308 -4.6195 0 1.9135 -3.5355 0 3.5355
  [4,16,-2.8284,1,2.8284,-3.6956,1,1.5308,-4.6195,0,1.9135,-3.5355,0,3.5355],
// 4 16 -3.6956 1 1.5308 -4 1 0 -5 0 0 -4.6195 0 1.9135
  [4,16,-3.6956,1,1.5308,-4,1,0,-5,0,0,-4.6195,0,1.9135],
// 4 16 -4 1 0 -3.6956 1 -1.5308 -4.6195 0 -1.9135 -5 0 0
  [4,16,-4,1,0,-3.6956,1,-1.5308,-4.6195,0,-1.9135,-5,0,0],
// 4 16 -3.6956 1 -1.5308 -2.8284 1 -2.8284 -3.5355 0 -3.5355 -4.6195 0 -1.9135
  [4,16,-3.6956,1,-1.5308,-2.8284,1,-2.8284,-3.5355,0,-3.5355,-4.6195,0,-1.9135],
// 4 16 -2.8284 1 -2.8284 -1.5308 1 -3.6956 -1.9135 0 -4.6195 -3.5355 0 -3.5355
  [4,16,-2.8284,1,-2.8284,-1.5308,1,-3.6956,-1.9135,0,-4.6195,-3.5355,0,-3.5355],
// 4 16 -1.5308 1 -3.6956 0 1 -4 0 0 -5 -1.9135 0 -4.6195
  [4,16,-1.5308,1,-3.6956,0,1,-4,0,0,-5,-1.9135,0,-4.6195],
// 4 16 0 1 -4 1.5308 1 -3.6956 1.9135 0 -4.6195 0 0 -5
  [4,16,0,1,-4,1.5308,1,-3.6956,1.9135,0,-4.6195,0,0,-5],
// 4 16 1.5308 1 -3.6956 2.8284 1 -2.8284 3.5355 0 -3.5355 1.9135 0 -4.6195
  [4,16,1.5308,1,-3.6956,2.8284,1,-2.8284,3.5355,0,-3.5355,1.9135,0,-4.6195],
// 4 16 2.8284 1 -2.8284 3.6956 1 -1.5308 4.6195 0 -1.9135 3.5355 0 -3.5355
  [4,16,2.8284,1,-2.8284,3.6956,1,-1.5308,4.6195,0,-1.9135,3.5355,0,-3.5355],
// 4 16 3.6956 1 -1.5308 4 1 0 5 0 0 4.6195 0 -1.9135
  [4,16,3.6956,1,-1.5308,4,1,0,5,0,0,4.6195,0,-1.9135],
// 0 // conditional lines
// 5 24 4 1 0 5 0 0 3.6956 1 -1.5308 3.6956 1 1.5308
  [5,24,4,1,0,5,0,0,3.6956,1,-1.5308,3.6956,1,1.5308],
// 5 24 3.6956 1 1.5308 4.6195 0 1.9135 4 1 0 2.8284 1 2.8284
  [5,24,3.6956,1,1.5308,4.6195,0,1.9135,4,1,0,2.8284,1,2.8284],
// 5 24 2.8284 1 2.8284 3.5355 0 3.5355 3.6956 1 1.5308 1.5308 1 3.6956
  [5,24,2.8284,1,2.8284,3.5355,0,3.5355,3.6956,1,1.5308,1.5308,1,3.6956],
// 5 24 1.5308 1 3.6956 1.9135 0 4.6195 2.8284 1 2.8284 0 1 4
  [5,24,1.5308,1,3.6956,1.9135,0,4.6195,2.8284,1,2.8284,0,1,4],
// 5 24 0 1 4 0 0 5 1.5308 1 3.6956 -1.5308 1 3.6956
  [5,24,0,1,4,0,0,5,1.5308,1,3.6956,-1.5308,1,3.6956],
// 5 24 -1.5308 1 3.6956 -1.9135 0 4.6195 0 1 4 -2.8284 1 2.8284
  [5,24,-1.5308,1,3.6956,-1.9135,0,4.6195,0,1,4,-2.8284,1,2.8284],
// 5 24 -2.8284 1 2.8284 -3.5355 0 3.5355 -1.5308 1 3.6956 -3.6956 1 1.5308
  [5,24,-2.8284,1,2.8284,-3.5355,0,3.5355,-1.5308,1,3.6956,-3.6956,1,1.5308],
// 5 24 -3.6956 1 1.5308 -4.6195 0 1.9135 -2.8284 1 2.8284 -4 1 0
  [5,24,-3.6956,1,1.5308,-4.6195,0,1.9135,-2.8284,1,2.8284,-4,1,0],
// 5 24 -4 1 0 -5 0 0 -3.6956 1 1.5308 -3.6956 1 -1.5308
  [5,24,-4,1,0,-5,0,0,-3.6956,1,1.5308,-3.6956,1,-1.5308],
// 5 24 -3.6956 1 -1.5308 -4.6195 0 -1.9135 -4 1 0 -2.8284 1 -2.8284
  [5,24,-3.6956,1,-1.5308,-4.6195,0,-1.9135,-4,1,0,-2.8284,1,-2.8284],
// 5 24 -2.8284 1 -2.8284 -3.5355 0 -3.5355 -3.6956 1 -1.5308 -1.5308 1 -3.6956
  [5,24,-2.8284,1,-2.8284,-3.5355,0,-3.5355,-3.6956,1,-1.5308,-1.5308,1,-3.6956],
// 5 24 -1.5308 1 -3.6956 -1.9135 0 -4.6195 -2.8284 1 -2.8284 0 1 -4
  [5,24,-1.5308,1,-3.6956,-1.9135,0,-4.6195,-2.8284,1,-2.8284,0,1,-4],
// 5 24 0 1 -4 0 0 -5 -1.5308 1 -3.6956 1.5308 1 -3.6956
  [5,24,0,1,-4,0,0,-5,-1.5308,1,-3.6956,1.5308,1,-3.6956],
// 5 24 1.5308 1 -3.6956 1.9135 0 -4.6195 0 1 -4 2.8284 1 -2.8284
  [5,24,1.5308,1,-3.6956,1.9135,0,-4.6195,0,1,-4,2.8284,1,-2.8284],
// 5 24 2.8284 1 -2.8284 3.5355 0 -3.5355 1.5308 1 -3.6956 3.6956 1 -1.5308
  [5,24,2.8284,1,-2.8284,3.5355,0,-3.5355,1.5308,1,-3.6956,3.6956,1,-1.5308],
// 5 24 3.6956 1 -1.5308 4.6195 0 -1.9135 2.8284 1 -2.8284 4 1 0
  [5,24,3.6956,1,-1.5308,4.6195,0,-1.9135,2.8284,1,-2.8284,4,1,0],
// 0 // Build by LDPartEditor (PrimGen 2.X)
];
module ldraw_lib__4_4con4(step=0, col=false, unit=2/5, alt=false, line=0.2, solid=!$preview)
    makepoly(ldraw_lib__4_4con4(), step=step, col=col, unit=unit, alt=alt, line=line, solid=solid);
ldraw_lib__4_4con4(line=0.2);
// main file
use <../lib.scad>
use <../p/4-4con4.scad>
use <../p/4-4cylo.scad>
use <s/3641s01.scad>
function ldraw_lib__3641() = [
// 0 Tyre  6/ 50 x  8 Offset Tread
// 0 Name: 3641.dat
// 0 Author: James Jessiman
// 0 !LDRAW_ORG Part UPDATE 2025-03
// 0 !LICENSE Licensed under CC BY 4.0 : see CAreadme.txt
// 
// 0 BFC CERTIFY CCW
  [0,"BFC","CERTIFY"],
  [0,"BFC","CCW"],
// 
// 0 !KEYWORDS Tire, town
// 
// 0 !CMDLINE -c256
// 
// 0 !HISTORY 1998-06-20 [PTadmin] Official Update 1998-06
// 0 !HISTORY 2003-01-23 [sbliss] Completed header; BFC'ed
// 0 !HISTORY 2003-08-01 [PTadmin] Official Update 2003-02
// 0 !HISTORY 2007-06-29 [PTadmin] Header formatted for Contributor Agreement
// 0 !HISTORY 2008-07-01 [PTadmin] Official Update 2008-01
// 0 !HISTORY 2008-07-07 [tcobbs] Fixed bow-tie quads (not good in BFC'ed file) (2004-08-10)
// 0 !HISTORY 2008-07-08 [guyvivan] Add inner detail (2004-12-19)
// 0 !HISTORY 2010-07-05 [PTadmin] Official Update 2010-02
// 0 !HISTORY 2025-02-14 [Blechtaler] used subfile, center back to standard resolution
// 0 !HISTORY 2025-03-30 [OrionP] Official Update 2025-03
// 
// 0 // Nomenclature: width_(mm)/profile_as_%age_of_width x rim_diameter_(mm)
// 
// 1 16 0 0 0 1 0 0 0 1 0 0 0 1 s\3641s01.dat
  [1,16,0,0,0,1,0,0,0,1,0,0,0,1, ldraw_lib__s__3641s01()],
// 1 16 0 0 0 0 -1 0 1 0 0 0 0 1 s\3641s01.dat
  [1,16,0,0,0,0,-1,0,1,0,0,0,0,1, ldraw_lib__s__3641s01()],
// 1 16 0 0 0 -1 0 0 0 -1 0 0 0 1 s\3641s01.dat
  [1,16,0,0,0,-1,0,0,0,-1,0,0,0,1, ldraw_lib__s__3641s01()],
// 1 16 0 0 0 0 1 0 -1 0 0 0 0 1 s\3641s01.dat
  [1,16,0,0,0,0,1,0,-1,0,0,0,0,1, ldraw_lib__s__3641s01()],
// 1 16 0 0 0 0 -1 0 -1 0 0 0 0 -1 s\3641s01.dat
  [1,16,0,0,0,0,-1,0,-1,0,0,0,0,-1, ldraw_lib__s__3641s01()],
// 1 16 0 0 0 1 0 0 0 -1 0 0 0 -1 s\3641s01.dat
  [1,16,0,0,0,1,0,0,0,-1,0,0,0,-1, ldraw_lib__s__3641s01()],
// 1 16 0 0 0 0 1 0 1 0 0 0 0 -1 s\3641s01.dat
  [1,16,0,0,0,0,1,0,1,0,0,0,0,-1, ldraw_lib__s__3641s01()],
// 1 16 0 0 0 -1 0 0 0 1 0 0 0 -1 s\3641s01.dat
  [1,16,0,0,0,-1,0,0,0,1,0,0,0,-1, ldraw_lib__s__3641s01()],
// 
// 0 BFC INVERTNEXT
  [0,"BFC","INVERTNEXT"],
// 1 16 0 0 -8 -10 0 0 0 0 10 0 4 0 4-4cylo.dat
  [1,16,0,0,-8,-10,0,0,0,0,10,0,4,0, ldraw_lib__4_4cylo()],
// 0 BFC INVERTNEXT
  [0,"BFC","INVERTNEXT"],
// 1 16 0 0 -4 2 0 0 0 0 2 0 1 0 4-4con4.dat
  [1,16,0,0,-4,2,0,0,0,0,2,0,1,0, ldraw_lib__4_4con4()],
// 0 BFC INVERTNEXT
  [0,"BFC","INVERTNEXT"],
// 1 16 0 0 3 8 0 0 0 0 8 0 -6 0 4-4cylo.dat
  [1,16,0,0,3,8,0,0,0,0,8,0,-6,0, ldraw_lib__4_4cylo()],
// 0 BFC INVERTNEXT
  [0,"BFC","INVERTNEXT"],
// 1 16 0 0 4 -2 0 0 0 0 2 0 -1 0 4-4con4.dat
  [1,16,0,0,4,-2,0,0,0,0,2,0,-1,0, ldraw_lib__4_4con4()],
// 0 BFC INVERTNEXT
  [0,"BFC","INVERTNEXT"],
// 1 16 0 0 8 10 0 0 0 0 10 0 -4 0 4-4cylo.dat
  [1,16,0,0,8,10,0,0,0,0,10,0,-4,0, ldraw_lib__4_4cylo()],
// 
// 2 24 0 -14 0 0 -18 0
  [2,24,0,-14,0,0,-18,0],
// 2 24 14 0 0 18 0 0
  [2,24,14,0,0,18,0,0],
// 2 24 0 14 0 0 18 0
  [2,24,0,14,0,0,18,0],
// 2 24 -14 0 0 -18 0 0
  [2,24,-14,0,0,-18,0,0],
// 2 24 9.8994 -9.8994 0 12.7278 -12.7278 0
  [2,24,9.8994,-9.8994,0,12.7278,-12.7278,0],
// 2 24 9.8994 9.8994 0 12.7278 12.7278 0
  [2,24,9.8994,9.8994,0,12.7278,12.7278,0],
// 2 24 -9.8994 9.8994 0 -12.7278 12.7278 0
  [2,24,-9.8994,9.8994,0,-12.7278,12.7278,0],
// 2 24 -9.8994 -9.8994 0 -12.7278 -12.7278 0
  [2,24,-9.8994,-9.8994,0,-12.7278,-12.7278,0],
];
module ldraw_lib__3641(step=0, col=false, unit=2/5, alt=false, line=0.2, solid=!$preview)
    makepoly(ldraw_lib__3641(), step=step, col=col, unit=unit, alt=alt, line=line, solid=solid);
ldraw_lib__3641(line=0.2);
